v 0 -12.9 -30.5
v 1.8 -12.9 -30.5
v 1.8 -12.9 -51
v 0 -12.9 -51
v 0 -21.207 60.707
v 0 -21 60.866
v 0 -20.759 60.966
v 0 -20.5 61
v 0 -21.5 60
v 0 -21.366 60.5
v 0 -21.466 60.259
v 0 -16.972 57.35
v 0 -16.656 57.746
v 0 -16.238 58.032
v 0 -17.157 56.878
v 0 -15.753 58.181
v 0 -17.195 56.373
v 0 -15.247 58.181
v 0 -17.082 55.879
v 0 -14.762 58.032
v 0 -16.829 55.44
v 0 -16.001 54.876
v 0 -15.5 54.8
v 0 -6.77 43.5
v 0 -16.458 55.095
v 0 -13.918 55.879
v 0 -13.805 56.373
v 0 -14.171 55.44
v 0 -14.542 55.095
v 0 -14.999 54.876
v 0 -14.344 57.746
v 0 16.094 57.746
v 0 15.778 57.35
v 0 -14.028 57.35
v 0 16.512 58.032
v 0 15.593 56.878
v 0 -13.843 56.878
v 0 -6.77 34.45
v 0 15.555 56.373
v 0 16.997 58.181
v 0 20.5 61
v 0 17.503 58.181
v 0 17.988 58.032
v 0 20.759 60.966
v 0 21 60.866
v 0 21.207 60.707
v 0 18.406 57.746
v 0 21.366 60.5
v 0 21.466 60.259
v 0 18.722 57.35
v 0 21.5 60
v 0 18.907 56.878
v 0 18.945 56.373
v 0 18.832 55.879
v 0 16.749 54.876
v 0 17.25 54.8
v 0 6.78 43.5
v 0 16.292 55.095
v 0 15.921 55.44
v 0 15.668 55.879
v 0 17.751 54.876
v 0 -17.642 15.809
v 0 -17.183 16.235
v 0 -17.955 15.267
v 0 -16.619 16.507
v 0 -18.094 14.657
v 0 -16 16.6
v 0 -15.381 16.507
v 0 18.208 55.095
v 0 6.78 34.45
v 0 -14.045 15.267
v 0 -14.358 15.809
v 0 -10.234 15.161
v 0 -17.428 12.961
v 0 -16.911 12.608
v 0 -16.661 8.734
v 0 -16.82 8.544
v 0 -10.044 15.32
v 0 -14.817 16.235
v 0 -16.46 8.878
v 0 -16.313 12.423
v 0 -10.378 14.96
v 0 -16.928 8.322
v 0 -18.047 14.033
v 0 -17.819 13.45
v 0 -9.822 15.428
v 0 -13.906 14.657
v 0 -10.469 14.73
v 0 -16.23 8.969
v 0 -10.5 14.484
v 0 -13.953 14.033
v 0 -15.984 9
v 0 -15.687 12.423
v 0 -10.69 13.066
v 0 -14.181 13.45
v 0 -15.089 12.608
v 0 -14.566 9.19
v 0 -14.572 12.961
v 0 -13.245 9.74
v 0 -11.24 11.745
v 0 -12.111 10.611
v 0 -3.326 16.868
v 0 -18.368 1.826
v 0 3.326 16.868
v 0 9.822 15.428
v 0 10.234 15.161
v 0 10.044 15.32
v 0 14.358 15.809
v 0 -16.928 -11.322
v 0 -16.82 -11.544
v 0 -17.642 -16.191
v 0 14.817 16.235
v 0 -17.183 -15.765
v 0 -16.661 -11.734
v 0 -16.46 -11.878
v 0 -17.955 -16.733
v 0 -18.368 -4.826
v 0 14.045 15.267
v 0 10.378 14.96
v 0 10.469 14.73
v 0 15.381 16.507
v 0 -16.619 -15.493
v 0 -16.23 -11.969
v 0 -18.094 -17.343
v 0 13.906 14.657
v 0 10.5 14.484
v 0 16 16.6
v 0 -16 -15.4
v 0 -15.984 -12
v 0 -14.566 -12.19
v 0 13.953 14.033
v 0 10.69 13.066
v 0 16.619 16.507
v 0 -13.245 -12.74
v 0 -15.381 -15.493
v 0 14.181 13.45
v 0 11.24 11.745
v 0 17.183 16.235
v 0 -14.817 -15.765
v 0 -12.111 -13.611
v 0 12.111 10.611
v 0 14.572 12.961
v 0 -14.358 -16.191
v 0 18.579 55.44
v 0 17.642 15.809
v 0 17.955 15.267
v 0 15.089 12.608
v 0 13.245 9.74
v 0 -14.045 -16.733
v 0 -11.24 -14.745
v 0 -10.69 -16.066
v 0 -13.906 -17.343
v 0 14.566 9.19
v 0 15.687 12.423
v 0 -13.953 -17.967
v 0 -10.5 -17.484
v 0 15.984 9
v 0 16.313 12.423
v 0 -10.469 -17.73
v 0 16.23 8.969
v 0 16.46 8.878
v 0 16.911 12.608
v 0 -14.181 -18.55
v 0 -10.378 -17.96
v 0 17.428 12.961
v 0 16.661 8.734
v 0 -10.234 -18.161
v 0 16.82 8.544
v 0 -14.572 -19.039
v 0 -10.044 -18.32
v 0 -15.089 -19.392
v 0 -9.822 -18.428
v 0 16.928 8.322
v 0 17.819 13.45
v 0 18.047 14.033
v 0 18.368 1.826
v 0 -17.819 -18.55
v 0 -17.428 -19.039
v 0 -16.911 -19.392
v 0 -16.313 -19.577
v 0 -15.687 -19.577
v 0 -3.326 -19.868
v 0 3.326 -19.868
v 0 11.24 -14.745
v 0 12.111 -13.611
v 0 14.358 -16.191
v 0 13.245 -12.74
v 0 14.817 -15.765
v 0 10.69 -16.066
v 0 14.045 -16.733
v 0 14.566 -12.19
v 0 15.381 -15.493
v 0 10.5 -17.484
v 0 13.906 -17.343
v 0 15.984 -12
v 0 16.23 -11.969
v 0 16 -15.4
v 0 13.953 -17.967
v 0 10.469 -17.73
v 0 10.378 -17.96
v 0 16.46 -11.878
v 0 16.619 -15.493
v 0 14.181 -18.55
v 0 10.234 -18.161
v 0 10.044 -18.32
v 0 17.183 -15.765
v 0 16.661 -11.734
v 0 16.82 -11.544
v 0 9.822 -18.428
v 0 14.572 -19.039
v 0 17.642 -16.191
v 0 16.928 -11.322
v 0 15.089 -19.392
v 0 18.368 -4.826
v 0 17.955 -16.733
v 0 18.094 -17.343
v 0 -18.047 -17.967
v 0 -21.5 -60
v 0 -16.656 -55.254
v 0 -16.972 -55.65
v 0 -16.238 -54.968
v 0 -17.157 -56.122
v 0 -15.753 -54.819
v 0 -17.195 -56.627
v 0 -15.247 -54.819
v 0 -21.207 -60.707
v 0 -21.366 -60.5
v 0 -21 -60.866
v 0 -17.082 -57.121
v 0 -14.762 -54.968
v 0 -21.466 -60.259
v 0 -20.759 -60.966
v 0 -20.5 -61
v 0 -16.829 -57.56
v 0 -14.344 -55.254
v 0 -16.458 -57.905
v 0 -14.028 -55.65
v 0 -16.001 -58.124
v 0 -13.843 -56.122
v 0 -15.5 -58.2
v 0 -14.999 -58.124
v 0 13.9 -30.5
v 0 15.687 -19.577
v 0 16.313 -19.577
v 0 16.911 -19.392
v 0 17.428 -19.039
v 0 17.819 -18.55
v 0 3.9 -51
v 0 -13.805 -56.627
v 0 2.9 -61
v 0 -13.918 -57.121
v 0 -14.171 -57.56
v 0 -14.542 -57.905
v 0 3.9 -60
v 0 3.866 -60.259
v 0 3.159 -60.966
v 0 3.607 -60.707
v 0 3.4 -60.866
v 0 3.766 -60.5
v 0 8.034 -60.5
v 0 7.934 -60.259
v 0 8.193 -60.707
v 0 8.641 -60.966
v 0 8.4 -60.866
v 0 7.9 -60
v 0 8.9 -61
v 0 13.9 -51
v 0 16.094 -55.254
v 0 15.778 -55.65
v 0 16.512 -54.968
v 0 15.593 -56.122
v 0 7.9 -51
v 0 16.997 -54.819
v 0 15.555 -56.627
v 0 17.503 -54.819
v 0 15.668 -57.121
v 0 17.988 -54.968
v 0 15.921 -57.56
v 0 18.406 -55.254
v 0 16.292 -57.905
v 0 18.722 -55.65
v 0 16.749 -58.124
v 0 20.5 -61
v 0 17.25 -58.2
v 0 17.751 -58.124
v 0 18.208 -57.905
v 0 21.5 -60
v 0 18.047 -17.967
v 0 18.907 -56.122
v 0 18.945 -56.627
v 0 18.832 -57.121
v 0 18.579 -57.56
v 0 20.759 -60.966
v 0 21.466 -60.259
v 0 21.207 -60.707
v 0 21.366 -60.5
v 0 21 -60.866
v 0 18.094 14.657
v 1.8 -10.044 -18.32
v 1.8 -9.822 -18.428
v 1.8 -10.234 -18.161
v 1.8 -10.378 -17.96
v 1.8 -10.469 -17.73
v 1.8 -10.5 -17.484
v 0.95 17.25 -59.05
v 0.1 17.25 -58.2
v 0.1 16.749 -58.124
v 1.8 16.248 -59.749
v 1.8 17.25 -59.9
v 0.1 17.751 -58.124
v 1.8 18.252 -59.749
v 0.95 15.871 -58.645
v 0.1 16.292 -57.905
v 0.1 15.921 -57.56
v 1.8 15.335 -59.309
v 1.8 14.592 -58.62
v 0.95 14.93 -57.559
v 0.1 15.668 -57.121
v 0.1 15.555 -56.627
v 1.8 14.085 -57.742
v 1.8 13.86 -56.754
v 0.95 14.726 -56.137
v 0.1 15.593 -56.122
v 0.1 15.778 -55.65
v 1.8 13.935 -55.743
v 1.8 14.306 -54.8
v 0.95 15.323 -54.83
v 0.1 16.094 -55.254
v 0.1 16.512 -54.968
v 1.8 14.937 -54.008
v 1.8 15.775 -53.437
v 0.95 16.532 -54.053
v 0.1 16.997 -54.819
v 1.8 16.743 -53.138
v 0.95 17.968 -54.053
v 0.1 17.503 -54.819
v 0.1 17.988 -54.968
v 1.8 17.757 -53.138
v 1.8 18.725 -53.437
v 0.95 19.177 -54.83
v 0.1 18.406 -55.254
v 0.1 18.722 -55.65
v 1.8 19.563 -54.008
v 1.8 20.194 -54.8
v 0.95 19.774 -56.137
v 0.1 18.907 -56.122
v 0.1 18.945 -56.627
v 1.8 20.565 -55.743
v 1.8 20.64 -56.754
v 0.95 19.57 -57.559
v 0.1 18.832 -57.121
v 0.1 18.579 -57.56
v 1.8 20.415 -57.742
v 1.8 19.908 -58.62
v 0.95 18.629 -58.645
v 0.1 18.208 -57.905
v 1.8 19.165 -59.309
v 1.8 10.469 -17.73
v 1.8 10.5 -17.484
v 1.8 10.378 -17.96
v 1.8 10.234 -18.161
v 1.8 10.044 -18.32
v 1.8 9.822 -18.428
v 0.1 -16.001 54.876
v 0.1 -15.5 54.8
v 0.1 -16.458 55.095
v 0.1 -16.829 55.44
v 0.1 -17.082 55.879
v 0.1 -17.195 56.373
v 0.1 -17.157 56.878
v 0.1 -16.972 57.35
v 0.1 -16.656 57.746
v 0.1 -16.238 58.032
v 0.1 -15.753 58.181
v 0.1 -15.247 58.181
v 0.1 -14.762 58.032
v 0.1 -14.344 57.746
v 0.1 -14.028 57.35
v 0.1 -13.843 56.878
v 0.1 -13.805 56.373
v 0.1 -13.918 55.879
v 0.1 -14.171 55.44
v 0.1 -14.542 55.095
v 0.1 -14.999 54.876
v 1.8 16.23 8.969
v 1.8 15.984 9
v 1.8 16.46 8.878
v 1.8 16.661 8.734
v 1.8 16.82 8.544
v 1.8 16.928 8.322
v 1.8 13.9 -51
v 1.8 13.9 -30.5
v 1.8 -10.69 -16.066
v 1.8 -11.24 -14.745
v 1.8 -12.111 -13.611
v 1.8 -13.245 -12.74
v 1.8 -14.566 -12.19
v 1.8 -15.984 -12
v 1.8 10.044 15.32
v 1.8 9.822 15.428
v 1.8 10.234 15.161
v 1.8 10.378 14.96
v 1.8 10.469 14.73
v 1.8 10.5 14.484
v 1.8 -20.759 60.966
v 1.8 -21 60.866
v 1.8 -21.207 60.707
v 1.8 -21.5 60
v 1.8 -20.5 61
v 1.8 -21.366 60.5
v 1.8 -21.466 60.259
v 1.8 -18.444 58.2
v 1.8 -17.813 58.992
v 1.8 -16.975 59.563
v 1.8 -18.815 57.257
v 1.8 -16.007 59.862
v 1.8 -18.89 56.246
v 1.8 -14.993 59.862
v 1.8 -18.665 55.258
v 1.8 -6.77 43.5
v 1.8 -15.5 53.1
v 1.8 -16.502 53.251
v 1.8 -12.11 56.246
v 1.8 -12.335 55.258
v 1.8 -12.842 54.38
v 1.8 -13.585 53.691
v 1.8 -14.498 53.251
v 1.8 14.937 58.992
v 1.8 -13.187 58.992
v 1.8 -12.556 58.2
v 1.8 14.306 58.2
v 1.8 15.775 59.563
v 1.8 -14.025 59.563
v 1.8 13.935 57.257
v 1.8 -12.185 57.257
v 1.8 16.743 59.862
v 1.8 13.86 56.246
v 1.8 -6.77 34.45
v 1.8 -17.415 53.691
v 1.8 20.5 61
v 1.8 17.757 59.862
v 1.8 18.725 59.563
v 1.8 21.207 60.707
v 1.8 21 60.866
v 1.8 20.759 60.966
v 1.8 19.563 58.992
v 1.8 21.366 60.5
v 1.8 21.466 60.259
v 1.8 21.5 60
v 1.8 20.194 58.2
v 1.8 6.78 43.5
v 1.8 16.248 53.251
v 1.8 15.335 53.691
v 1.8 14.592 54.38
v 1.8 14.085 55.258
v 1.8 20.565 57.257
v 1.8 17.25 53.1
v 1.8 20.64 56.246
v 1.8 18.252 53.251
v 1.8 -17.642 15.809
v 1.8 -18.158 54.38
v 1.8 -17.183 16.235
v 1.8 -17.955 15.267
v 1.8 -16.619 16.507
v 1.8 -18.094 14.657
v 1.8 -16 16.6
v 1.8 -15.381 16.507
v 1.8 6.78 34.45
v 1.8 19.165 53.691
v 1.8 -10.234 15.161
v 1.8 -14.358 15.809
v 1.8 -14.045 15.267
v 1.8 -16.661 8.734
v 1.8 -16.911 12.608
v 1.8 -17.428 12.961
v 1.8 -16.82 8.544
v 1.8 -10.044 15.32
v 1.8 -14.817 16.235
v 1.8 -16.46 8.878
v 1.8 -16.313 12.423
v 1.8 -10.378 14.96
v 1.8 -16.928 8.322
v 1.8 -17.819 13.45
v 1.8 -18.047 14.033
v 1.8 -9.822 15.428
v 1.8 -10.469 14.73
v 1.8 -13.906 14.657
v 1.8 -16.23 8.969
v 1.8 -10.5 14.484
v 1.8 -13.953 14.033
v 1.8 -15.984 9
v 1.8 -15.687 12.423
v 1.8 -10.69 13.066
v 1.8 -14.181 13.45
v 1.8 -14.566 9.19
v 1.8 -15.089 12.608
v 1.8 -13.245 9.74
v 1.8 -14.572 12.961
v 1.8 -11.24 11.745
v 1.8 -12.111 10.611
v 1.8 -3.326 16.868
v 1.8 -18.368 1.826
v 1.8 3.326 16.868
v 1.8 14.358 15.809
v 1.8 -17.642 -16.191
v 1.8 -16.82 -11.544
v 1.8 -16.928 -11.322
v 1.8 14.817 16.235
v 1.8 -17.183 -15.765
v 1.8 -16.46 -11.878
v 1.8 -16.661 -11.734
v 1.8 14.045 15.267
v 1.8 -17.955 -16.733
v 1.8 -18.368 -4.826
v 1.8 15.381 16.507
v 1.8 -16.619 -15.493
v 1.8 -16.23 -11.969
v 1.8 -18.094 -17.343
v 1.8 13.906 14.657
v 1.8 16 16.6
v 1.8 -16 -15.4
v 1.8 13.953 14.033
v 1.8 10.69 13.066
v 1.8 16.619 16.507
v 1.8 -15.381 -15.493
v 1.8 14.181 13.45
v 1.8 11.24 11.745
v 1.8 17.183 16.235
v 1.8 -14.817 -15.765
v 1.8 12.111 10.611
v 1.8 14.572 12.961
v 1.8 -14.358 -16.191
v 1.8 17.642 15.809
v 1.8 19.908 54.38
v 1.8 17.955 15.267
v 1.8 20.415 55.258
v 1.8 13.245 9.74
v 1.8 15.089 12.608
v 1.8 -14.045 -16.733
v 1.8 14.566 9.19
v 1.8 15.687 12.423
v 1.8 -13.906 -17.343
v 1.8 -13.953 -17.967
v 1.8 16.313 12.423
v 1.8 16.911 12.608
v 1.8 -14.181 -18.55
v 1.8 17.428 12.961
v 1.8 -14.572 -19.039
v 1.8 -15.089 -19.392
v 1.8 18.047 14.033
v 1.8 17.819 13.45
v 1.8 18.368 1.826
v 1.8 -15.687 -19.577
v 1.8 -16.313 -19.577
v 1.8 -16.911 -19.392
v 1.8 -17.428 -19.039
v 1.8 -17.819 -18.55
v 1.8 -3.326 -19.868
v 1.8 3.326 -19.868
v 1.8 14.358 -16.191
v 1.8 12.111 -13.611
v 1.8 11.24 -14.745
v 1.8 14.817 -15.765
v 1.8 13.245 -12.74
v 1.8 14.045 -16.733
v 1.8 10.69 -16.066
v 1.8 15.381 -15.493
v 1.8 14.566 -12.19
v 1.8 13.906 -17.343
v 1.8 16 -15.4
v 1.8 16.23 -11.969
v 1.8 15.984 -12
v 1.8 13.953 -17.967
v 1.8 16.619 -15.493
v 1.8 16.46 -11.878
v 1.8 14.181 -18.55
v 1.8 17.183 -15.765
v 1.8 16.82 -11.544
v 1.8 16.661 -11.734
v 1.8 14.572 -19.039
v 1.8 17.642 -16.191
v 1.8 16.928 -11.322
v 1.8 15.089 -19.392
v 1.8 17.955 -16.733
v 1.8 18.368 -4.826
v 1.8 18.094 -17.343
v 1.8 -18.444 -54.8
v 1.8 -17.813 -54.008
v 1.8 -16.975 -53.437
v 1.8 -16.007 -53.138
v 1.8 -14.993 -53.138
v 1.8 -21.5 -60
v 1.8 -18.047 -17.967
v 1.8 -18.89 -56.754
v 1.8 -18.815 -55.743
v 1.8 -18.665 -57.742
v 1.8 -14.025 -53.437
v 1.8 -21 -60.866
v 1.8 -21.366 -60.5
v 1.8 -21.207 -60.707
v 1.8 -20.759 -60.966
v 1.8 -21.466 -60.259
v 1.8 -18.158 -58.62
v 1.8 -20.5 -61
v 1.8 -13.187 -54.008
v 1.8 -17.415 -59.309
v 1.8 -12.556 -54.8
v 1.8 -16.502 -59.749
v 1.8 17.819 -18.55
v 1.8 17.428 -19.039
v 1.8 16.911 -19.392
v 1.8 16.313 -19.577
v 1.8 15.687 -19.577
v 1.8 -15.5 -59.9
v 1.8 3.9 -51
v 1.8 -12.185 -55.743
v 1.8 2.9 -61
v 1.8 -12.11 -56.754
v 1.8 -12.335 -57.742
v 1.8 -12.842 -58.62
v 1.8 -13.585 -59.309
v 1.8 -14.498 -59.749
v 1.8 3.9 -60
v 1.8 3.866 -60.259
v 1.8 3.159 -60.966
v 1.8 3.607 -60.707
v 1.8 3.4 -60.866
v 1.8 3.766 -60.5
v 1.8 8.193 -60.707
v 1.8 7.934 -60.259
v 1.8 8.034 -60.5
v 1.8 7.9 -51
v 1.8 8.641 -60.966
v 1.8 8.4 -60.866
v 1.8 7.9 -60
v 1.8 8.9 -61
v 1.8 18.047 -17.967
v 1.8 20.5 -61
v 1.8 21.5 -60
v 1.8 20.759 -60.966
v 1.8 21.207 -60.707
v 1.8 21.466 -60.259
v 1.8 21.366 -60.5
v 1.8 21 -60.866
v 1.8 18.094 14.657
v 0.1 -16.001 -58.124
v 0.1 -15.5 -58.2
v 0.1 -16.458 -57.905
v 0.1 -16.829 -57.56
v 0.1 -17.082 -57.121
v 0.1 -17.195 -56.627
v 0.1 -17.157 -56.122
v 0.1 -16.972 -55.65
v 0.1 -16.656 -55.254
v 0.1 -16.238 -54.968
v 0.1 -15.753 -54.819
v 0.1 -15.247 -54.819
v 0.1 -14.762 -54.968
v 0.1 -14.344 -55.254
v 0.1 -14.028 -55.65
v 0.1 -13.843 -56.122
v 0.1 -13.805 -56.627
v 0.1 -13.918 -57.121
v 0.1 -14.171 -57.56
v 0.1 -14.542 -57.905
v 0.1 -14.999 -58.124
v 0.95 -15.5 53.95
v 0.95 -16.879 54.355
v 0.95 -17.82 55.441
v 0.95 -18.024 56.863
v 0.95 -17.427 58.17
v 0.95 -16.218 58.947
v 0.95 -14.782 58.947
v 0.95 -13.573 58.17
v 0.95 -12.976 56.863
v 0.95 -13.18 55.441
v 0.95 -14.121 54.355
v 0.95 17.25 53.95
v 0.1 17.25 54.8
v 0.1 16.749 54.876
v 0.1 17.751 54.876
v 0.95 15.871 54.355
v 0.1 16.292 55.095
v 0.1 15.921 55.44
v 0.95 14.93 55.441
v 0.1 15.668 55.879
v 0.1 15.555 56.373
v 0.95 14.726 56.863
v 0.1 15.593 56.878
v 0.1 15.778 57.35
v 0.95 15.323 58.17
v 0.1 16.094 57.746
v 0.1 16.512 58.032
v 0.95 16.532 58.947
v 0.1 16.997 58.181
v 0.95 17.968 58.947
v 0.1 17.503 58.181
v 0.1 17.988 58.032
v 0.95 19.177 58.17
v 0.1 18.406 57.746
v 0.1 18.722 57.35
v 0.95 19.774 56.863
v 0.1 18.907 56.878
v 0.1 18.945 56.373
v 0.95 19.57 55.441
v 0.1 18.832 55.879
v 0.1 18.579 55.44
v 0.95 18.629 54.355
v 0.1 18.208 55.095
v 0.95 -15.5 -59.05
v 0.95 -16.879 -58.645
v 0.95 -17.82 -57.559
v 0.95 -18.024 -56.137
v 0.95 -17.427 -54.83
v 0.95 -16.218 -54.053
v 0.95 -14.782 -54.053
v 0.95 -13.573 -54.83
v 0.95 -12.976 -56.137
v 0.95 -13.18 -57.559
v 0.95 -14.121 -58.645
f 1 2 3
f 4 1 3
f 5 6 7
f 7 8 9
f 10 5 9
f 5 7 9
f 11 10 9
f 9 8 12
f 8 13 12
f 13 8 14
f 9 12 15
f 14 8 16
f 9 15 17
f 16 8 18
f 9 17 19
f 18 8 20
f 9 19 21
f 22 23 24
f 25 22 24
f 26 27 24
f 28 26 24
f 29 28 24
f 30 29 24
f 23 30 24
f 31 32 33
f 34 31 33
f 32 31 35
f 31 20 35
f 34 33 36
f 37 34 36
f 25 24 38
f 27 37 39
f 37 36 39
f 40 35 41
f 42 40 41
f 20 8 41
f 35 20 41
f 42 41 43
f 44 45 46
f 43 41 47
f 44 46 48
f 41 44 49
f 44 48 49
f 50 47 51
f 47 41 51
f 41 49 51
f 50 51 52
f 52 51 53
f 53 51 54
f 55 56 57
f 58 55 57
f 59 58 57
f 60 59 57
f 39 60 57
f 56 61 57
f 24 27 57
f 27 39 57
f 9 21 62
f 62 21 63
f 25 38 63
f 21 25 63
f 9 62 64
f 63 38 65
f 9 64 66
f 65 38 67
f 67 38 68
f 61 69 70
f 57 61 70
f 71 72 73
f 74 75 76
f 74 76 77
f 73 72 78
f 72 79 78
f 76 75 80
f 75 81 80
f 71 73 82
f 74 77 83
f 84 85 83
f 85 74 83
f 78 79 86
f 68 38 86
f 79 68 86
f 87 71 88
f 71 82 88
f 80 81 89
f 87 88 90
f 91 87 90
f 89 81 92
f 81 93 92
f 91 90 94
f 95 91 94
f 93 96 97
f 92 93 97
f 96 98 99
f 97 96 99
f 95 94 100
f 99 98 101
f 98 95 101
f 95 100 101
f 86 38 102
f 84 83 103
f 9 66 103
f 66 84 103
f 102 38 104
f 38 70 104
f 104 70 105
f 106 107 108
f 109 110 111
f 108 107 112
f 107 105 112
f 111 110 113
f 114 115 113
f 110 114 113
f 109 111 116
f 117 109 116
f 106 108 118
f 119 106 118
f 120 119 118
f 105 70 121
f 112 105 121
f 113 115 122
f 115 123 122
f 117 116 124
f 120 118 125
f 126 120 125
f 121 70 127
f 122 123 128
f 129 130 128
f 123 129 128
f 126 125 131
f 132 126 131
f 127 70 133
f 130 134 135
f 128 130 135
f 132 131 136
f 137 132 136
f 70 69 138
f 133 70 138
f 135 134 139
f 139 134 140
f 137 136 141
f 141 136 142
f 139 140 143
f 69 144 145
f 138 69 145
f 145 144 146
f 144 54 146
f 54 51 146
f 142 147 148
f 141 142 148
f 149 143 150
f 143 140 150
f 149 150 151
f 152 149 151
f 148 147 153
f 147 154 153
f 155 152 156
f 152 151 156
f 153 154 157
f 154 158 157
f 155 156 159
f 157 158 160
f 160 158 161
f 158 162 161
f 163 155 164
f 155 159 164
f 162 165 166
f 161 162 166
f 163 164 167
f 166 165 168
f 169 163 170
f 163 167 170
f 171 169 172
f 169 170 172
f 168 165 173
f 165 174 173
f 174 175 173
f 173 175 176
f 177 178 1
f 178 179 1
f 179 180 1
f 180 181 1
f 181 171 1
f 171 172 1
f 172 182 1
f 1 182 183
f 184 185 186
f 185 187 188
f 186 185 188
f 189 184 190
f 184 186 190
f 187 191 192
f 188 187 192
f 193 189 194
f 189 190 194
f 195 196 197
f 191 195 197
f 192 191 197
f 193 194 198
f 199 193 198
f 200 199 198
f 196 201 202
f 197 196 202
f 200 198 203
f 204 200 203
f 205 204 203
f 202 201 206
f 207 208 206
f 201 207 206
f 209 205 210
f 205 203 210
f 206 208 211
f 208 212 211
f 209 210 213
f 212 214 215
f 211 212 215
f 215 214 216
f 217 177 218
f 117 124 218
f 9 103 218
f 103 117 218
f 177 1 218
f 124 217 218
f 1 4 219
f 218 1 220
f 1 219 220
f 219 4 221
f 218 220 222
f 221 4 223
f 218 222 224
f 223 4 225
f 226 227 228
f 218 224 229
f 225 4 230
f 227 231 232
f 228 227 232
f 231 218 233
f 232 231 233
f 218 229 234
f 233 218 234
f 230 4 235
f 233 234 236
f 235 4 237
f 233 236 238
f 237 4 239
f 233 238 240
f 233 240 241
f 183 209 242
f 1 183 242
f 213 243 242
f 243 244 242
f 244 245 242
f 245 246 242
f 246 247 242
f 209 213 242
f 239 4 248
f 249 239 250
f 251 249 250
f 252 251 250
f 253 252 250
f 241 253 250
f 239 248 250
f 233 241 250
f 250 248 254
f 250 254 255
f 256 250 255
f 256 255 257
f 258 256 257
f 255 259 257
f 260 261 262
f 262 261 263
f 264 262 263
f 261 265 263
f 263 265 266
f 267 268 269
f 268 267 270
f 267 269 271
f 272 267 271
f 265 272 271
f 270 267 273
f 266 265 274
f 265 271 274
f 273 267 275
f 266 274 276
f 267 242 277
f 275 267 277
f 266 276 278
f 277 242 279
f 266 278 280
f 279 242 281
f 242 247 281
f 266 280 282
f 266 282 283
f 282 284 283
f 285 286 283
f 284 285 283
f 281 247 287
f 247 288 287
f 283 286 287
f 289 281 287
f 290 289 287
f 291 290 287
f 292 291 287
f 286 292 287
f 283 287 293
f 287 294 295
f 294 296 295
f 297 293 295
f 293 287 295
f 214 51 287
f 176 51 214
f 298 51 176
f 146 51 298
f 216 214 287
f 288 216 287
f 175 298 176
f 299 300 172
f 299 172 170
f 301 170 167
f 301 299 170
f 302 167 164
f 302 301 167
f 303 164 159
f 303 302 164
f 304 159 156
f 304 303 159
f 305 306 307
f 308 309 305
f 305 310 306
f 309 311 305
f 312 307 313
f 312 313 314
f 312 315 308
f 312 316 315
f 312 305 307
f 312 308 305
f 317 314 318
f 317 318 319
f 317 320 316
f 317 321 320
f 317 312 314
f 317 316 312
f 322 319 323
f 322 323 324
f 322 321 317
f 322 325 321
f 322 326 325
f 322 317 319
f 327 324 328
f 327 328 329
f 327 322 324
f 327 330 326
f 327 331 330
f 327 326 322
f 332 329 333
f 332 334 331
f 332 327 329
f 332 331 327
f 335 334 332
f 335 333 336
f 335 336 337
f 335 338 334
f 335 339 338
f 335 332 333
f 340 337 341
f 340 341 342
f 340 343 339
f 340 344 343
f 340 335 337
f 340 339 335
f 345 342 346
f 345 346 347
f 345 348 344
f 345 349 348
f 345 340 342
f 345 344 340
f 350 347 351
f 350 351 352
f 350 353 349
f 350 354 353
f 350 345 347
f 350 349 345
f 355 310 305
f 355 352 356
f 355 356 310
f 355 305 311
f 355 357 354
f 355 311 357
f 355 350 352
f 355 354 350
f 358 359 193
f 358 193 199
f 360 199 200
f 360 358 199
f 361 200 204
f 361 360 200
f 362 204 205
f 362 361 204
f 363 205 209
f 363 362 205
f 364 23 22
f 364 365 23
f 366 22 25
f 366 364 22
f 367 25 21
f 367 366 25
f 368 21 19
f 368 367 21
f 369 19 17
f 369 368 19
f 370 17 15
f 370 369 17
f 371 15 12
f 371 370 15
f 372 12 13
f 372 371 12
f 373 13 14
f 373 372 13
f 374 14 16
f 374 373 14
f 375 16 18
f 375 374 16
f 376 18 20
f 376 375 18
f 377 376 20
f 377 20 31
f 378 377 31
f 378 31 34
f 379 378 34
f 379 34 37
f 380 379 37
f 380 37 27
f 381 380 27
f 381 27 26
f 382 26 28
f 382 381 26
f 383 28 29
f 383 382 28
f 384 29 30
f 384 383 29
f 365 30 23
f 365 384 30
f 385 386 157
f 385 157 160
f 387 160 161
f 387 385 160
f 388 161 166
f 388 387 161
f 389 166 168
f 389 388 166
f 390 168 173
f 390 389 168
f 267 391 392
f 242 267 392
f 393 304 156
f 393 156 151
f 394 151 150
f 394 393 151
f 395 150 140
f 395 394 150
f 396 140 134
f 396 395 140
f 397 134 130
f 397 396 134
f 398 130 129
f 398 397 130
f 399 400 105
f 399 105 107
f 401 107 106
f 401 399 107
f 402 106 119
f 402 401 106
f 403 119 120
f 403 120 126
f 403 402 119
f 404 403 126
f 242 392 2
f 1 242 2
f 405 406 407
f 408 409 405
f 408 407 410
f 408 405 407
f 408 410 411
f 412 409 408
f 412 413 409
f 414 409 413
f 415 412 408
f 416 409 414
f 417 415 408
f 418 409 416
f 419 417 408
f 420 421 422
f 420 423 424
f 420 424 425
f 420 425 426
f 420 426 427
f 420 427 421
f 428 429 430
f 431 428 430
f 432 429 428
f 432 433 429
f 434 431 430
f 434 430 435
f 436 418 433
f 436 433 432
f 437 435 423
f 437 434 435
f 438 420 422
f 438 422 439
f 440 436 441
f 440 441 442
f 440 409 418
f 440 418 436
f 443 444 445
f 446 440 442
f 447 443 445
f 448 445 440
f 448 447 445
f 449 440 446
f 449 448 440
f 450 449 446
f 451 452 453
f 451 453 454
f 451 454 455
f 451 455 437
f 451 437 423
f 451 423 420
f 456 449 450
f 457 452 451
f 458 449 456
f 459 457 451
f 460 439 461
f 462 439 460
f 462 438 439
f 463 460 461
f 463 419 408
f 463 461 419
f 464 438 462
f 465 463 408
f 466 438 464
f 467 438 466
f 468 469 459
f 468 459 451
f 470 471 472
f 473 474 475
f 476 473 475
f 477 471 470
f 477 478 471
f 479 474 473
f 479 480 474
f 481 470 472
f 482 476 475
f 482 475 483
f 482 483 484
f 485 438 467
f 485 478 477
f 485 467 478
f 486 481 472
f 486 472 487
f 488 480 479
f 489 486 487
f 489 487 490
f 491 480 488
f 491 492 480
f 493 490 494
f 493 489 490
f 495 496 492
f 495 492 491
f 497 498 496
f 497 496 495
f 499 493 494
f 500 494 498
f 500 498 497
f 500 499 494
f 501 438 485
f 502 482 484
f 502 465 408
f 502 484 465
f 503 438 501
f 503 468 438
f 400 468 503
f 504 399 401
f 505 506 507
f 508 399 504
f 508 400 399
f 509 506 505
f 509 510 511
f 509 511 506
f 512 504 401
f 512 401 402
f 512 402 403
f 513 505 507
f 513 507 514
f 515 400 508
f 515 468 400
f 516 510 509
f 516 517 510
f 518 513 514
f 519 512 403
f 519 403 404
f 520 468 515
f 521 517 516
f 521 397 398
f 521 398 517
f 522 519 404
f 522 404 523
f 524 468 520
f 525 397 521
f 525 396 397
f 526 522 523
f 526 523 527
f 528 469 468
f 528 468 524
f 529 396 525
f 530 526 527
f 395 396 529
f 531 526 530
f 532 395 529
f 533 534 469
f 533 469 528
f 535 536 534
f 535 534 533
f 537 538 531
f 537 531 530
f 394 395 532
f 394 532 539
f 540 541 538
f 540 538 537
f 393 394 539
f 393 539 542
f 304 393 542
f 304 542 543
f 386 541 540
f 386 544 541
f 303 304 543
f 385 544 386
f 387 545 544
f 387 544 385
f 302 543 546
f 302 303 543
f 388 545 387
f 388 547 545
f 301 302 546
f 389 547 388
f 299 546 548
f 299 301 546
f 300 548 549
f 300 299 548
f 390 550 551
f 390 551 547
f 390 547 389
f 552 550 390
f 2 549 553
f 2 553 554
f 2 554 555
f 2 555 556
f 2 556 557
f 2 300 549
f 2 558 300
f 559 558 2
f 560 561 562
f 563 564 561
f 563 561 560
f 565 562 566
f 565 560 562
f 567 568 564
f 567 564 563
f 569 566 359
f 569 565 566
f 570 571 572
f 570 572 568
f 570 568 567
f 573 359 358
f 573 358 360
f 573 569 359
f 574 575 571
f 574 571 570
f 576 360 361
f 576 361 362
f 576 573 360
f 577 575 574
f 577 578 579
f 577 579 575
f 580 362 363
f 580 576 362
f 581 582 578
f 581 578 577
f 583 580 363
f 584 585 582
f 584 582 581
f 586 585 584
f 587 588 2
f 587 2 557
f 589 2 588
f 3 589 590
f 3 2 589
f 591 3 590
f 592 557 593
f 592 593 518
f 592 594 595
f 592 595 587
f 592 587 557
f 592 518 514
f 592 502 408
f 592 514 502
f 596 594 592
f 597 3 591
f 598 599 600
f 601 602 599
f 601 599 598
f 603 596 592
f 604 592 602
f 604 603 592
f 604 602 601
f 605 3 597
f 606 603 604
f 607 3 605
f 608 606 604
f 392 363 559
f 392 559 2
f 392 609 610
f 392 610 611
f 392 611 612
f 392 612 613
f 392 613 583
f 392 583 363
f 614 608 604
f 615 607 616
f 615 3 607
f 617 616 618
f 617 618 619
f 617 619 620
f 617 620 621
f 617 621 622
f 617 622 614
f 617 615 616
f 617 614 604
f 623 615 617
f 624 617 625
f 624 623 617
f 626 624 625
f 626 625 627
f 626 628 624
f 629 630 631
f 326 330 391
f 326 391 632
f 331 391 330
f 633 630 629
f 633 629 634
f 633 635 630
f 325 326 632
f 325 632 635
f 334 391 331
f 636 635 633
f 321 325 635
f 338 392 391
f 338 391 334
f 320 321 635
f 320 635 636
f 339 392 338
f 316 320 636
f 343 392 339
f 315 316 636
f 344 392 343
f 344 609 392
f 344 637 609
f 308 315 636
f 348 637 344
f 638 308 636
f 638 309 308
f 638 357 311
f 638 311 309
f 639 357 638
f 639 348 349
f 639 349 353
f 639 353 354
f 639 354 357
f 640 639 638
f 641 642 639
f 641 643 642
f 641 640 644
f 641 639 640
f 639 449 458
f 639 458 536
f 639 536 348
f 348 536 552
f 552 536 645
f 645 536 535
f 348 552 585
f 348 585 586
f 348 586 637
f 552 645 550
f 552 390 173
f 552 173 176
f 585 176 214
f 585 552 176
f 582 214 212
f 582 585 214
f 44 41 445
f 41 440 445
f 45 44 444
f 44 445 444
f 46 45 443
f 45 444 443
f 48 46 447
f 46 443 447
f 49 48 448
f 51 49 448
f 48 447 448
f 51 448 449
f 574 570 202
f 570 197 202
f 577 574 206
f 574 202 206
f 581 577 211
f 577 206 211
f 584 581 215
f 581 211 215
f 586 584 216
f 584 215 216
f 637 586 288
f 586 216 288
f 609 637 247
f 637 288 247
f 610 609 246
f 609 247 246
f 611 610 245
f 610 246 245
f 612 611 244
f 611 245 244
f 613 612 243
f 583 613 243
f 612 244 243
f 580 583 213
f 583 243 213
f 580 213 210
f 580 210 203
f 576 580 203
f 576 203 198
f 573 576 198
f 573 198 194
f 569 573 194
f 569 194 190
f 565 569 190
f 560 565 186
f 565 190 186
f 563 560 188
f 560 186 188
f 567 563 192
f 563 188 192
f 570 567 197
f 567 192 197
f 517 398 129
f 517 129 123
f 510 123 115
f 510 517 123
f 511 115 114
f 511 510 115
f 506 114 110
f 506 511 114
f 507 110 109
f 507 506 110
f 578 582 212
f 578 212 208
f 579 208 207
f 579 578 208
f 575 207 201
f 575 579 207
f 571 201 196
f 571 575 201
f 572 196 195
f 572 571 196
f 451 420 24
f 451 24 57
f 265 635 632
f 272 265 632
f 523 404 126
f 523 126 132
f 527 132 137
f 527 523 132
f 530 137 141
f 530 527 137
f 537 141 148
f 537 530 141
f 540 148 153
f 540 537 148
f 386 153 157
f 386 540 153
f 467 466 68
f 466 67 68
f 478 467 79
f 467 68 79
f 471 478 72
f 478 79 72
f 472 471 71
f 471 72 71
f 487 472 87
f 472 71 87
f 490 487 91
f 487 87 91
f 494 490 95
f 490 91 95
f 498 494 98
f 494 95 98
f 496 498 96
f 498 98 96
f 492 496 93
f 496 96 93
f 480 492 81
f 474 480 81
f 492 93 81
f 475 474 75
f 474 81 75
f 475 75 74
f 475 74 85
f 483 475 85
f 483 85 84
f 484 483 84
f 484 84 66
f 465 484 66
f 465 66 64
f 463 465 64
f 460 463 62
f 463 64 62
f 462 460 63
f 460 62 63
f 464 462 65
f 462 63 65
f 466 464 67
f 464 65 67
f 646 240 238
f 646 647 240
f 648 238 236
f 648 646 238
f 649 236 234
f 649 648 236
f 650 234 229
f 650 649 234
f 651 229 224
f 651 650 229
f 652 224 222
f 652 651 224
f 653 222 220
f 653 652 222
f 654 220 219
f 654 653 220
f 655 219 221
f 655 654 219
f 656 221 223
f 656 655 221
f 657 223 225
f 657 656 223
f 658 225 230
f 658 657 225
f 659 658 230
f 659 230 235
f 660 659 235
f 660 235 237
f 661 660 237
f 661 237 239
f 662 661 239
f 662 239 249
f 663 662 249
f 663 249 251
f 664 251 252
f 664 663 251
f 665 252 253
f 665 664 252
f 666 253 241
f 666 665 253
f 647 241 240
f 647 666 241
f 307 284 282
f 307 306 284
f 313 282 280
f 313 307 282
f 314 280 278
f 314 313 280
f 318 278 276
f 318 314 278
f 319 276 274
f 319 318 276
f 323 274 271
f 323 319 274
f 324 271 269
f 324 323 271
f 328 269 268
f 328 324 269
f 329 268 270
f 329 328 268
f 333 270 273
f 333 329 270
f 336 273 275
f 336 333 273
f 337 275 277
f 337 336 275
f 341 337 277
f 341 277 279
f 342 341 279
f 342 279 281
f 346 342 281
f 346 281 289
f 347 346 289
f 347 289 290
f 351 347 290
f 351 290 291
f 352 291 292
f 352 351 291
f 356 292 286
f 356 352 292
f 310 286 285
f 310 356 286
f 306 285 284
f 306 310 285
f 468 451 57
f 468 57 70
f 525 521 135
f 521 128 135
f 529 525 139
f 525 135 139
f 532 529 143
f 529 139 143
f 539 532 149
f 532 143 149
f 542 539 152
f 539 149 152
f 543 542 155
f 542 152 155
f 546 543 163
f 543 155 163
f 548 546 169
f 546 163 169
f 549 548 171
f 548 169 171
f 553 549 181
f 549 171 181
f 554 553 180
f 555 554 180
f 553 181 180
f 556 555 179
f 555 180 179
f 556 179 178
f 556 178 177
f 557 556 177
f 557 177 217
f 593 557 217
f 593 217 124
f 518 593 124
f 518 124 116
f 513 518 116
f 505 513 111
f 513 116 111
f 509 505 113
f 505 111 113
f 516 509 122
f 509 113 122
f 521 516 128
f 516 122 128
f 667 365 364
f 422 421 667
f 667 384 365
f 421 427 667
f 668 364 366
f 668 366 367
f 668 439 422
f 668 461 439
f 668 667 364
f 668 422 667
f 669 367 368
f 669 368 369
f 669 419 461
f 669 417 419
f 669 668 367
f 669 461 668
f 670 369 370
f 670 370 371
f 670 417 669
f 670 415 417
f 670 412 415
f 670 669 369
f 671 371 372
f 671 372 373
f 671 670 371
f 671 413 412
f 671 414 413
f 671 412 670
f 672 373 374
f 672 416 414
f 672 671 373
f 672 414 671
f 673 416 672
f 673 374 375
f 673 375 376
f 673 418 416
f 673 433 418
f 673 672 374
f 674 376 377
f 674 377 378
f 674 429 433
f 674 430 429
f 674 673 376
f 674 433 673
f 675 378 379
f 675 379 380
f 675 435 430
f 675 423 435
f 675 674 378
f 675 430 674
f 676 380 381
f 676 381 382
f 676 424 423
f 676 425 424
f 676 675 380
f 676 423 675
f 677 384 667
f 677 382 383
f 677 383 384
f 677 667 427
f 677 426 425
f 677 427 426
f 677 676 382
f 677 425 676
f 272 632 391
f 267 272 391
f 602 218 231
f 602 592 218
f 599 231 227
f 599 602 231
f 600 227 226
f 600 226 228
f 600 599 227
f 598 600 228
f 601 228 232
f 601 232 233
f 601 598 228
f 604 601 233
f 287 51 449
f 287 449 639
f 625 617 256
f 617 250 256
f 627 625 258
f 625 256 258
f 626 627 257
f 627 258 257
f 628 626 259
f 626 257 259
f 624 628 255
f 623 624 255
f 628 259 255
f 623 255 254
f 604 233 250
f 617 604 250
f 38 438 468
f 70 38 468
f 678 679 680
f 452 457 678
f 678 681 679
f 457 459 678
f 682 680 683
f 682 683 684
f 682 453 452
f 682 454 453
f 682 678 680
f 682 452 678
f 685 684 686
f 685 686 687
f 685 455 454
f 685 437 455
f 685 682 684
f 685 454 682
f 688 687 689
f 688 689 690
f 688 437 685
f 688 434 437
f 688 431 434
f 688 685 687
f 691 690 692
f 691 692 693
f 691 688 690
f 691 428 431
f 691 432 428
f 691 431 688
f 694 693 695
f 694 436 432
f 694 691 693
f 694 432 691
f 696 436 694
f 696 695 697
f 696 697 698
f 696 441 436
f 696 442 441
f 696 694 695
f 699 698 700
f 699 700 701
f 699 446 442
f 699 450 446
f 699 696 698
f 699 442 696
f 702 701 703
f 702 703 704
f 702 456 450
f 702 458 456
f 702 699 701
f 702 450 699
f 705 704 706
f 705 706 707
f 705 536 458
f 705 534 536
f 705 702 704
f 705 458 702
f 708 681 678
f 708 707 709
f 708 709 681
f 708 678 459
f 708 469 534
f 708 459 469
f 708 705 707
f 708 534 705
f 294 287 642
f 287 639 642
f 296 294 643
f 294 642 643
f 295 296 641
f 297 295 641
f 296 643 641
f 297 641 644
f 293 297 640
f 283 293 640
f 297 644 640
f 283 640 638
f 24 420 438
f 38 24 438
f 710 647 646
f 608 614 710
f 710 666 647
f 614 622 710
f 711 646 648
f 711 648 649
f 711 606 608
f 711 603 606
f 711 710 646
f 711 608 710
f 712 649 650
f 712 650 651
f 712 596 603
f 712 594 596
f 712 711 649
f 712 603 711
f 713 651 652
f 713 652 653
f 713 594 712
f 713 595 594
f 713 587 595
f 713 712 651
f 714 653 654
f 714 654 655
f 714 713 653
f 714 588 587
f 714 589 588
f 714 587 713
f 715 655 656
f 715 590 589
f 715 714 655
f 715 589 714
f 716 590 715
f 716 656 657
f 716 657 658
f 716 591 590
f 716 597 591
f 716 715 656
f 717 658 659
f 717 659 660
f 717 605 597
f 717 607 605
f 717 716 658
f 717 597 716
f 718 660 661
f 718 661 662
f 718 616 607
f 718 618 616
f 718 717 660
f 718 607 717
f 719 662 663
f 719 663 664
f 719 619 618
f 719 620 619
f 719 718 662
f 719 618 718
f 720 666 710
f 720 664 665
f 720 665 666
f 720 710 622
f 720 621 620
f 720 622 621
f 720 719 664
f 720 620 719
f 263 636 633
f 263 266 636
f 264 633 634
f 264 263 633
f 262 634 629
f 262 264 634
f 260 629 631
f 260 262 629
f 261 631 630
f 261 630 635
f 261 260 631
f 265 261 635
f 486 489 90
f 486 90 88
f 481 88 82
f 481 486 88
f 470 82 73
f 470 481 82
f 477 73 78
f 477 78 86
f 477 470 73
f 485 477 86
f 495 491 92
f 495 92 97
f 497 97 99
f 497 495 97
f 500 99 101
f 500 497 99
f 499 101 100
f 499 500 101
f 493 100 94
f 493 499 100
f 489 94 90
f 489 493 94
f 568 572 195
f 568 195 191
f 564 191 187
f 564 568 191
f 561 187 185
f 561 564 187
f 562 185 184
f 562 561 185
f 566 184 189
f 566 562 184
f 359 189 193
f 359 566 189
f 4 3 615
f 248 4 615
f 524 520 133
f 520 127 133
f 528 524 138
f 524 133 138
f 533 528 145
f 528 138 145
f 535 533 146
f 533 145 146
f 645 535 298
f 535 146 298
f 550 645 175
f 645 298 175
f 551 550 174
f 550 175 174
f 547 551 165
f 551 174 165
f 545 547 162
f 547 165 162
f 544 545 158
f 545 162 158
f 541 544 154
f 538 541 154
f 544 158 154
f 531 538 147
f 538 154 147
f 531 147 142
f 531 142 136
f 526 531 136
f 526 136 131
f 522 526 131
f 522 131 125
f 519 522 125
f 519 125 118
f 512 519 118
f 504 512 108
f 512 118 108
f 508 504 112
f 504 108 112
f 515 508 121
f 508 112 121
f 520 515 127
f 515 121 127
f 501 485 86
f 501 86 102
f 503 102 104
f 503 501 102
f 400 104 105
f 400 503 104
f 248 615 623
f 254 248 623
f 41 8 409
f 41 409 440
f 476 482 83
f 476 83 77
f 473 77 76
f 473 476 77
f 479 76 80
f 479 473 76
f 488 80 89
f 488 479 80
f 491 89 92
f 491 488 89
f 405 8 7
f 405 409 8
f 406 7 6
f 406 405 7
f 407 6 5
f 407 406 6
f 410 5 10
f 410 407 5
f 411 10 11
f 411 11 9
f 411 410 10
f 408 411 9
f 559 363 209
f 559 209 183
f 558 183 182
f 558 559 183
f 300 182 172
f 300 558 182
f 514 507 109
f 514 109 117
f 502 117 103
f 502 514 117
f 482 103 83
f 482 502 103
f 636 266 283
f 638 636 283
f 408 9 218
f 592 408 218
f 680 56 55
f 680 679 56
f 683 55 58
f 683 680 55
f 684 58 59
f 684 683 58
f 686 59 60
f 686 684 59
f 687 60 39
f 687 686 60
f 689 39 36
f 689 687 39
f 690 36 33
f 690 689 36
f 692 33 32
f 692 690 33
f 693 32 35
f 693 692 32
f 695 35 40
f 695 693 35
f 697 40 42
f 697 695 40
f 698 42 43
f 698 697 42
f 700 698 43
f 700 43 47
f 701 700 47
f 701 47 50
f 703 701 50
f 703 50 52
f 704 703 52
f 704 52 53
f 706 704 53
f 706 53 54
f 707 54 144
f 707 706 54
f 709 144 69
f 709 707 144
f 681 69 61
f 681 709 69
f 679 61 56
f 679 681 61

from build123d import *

# Parameters (mm, degrees)
SKETCH1_W                                    = 122
SKETCH1_H                                    = 43
BOSS_EXTRUDE1_DEPTH                          = 1.8
SKETCH2_W                                    = 9.05
SKETCH2_H                                    = 13.55
CUT_EXTRUDE1_DEPTH                           = 1.8
CSK_FOR_M3_COUNTERSUNK_FLAT_HEAD_SCR_2_COUNT = 2
CSK_FOR_M3_COUNTERSUNK_FLAT_HEAD_SCR_2_PITCH = 32.75
CSK_FOR_M3_COUNTERSUNK_FLAT_HEAD_SCR_3_COUNT = 2
CSK_FOR_M3_COUNTERSUNK_FLAT_HEAD_SCR_3_PITCH = 117.650169996
CSK_FOR_M3_COUNTERSUNK_FLAT_HEAD_SCR_4_COUNT = 2
CSK_FOR_M3_COUNTERSUNK_FLAT_HEAD_SCR_4_PITCH = 113
CUT_EXTRUDE2_DEPTH                           = 1.8
FILLET1_R                                    = 1
F_4_2_4_2_DIAMETER_HOLE1_D                   = 4.2
F_4_2_4_2_DIAMETER_HOLE1_DEPTH               = 1.8
F_4_2_4_2_DIAMETER_HOLE1_TIP                 = 1.2618073
CUT_EXTRUDE3_DEPTH                           = 1.8


with BuildPart() as part:
    # Sketch1 → Boss-Extrude1 (new body)
    with BuildSketch(Plane(origin=(0, 0, 0), x_dir=(0, 0, -1), z_dir=(1, 0, 0))):
        Rectangle(SKETCH1_W, SKETCH1_H)
    extrude(amount=BOSS_EXTRUDE1_DEPTH)

    # Sketch2 → Cut-Extrude1 (cut)
    with BuildSketch(Plane(origin=(1.8, 0, 0), x_dir=(0, 0, -1), z_dir=(1, 0, 0))):
        with Locations((-38.975, 0.005)):
            Rectangle(SKETCH2_W, SKETCH2_H)
    extrude(amount=-CUT_EXTRUDE1_DEPTH, mode=Mode.SUBTRACT)

    # Sketch3 → CSK for M3 Countersunk Flat Head Screw1 (revolve, cut)
    with BuildSketch(Plane(origin=(1.8, -15.5, 56.5), x_dir=(0, 0, -1), z_dir=(0, 1, 0))):
        Polygon((0, 0), (0, 1.8), (1.7, 1.8), (1.7, 1.7), (3.4, 0), align=None)
    csk_for_m3_countersunk_flat_head_screw1 = revolve(axis=Axis((8.15, -15.5, 56.5), (-1, 0, 0)), mode=Mode.SUBTRACT)

    # CSK for M3 Countersunk Flat Head Scr 2: CSK for M3 Countersunk Flat Head Screw1 ×2
    with Locations(*[(0, i * CSK_FOR_M3_COUNTERSUNK_FLAT_HEAD_SCR_2_PITCH, 0) for i in range(1, CSK_FOR_M3_COUNTERSUNK_FLAT_HEAD_SCR_2_COUNT)]):
        add(csk_for_m3_countersunk_flat_head_screw1, mode=Mode.SUBTRACT)

    # CSK for M3 Countersunk Flat Head Scr 3: CSK for M3 Countersunk Flat Head Screw1 ×2
    with Locations(*[Vector(0, 0.278367639, -0.9604746) * (i * CSK_FOR_M3_COUNTERSUNK_FLAT_HEAD_SCR_3_PITCH) for i in range(1, CSK_FOR_M3_COUNTERSUNK_FLAT_HEAD_SCR_3_COUNT)]):
        add(csk_for_m3_countersunk_flat_head_screw1, mode=Mode.SUBTRACT)

    # CSK for M3 Countersunk Flat Head Scr 4: CSK for M3 Countersunk Flat Head Screw1 ×2
    with Locations(*[(0, 0, -i * CSK_FOR_M3_COUNTERSUNK_FLAT_HEAD_SCR_4_PITCH) for i in range(1, CSK_FOR_M3_COUNTERSUNK_FLAT_HEAD_SCR_4_COUNT)]):
        add(csk_for_m3_countersunk_flat_head_screw1, mode=Mode.SUBTRACT)

    # Sketch5 → Cut-Extrude2 (cut)
    with BuildSketch(Plane(origin=(1.8, 0, 0), x_dir=(0, 0, -1), z_dir=(1, 0, 0))):
        Polygon((30.5, -12.9), (51, -12.9), (51, 3.9), (61, 3.9), (61, 7.9), (51, 7.9), (51, 13.9), (30.5, 13.9), align=None)
    extrude(amount=-CUT_EXTRUDE2_DEPTH, mode=Mode.SUBTRACT)

    # Fillet1
    fillet1_edges = [part.edges().sort_by_distance(p)[0] for p in [
        (0.9, 7.9, -61),
        (0.9, 3.9, -61),
        (0.9, 21.5, 61),
        (0.9, 21.5, -61),
        (0.9, -21.5, -61),
        (0.9, -21.5, 61),
    ]]
    fillet(fillet1_edges, radius=FILLET1_R)

    # Ø4.2 (4.2) Diameter Hole1
    with Locations(Plane(origin=(1.8, 0, 0), x_dir=(0, 0, -1), z_dir=(1, 0, 0))):
        with Locations((-14.5, 16), (17.5, 16), (17.5, -16), (-14.5, -16)):
            Hole(F_4_2_4_2_DIAMETER_HOLE1_D / 2, depth=F_4_2_4_2_DIAMETER_HOLE1_DEPTH)
            with Locations((0, 0, -(F_4_2_4_2_DIAMETER_HOLE1_DEPTH + F_4_2_4_2_DIAMETER_HOLE1_TIP / 2))):  # 118° drill point
                Cone(0, F_4_2_4_2_DIAMETER_HOLE1_D / 2, F_4_2_4_2_DIAMETER_HOLE1_TIP, mode=Mode.SUBTRACT)

    # Sketch8 → Cut-Extrude3 (cut)
    with BuildSketch(Plane(origin=(1.8, 0, 0), x_dir=(0, 0, -1), z_dir=(1, 0, 0))):
        with BuildLine():
            ThreePointArc((12.000022812, 15.984159355), (13.610912703, 12.110912703), (17.484159355, 10.500022812))
            ThreePointArc((17.484159355, 10.500022812), (18.064905248, 10.312049545), (18.428192241, 9.821516873))
            ThreePointArc((18.428192241, 9.821516873), (20.05, 0), (18.428192241, -9.821516873))
            ThreePointArc((18.428192241, -9.821516873), (18.064905248, -10.312049545), (17.484159355, -10.500022812))
            ThreePointArc((17.484159355, -10.500022812), (13.610912703, -12.110912703), (12.000022812, -15.984159355))
            ThreePointArc((12.000022812, -15.984159355), (11.812049545, -16.564905248), (11.321516873, -16.928192241))
            ThreePointArc((11.321516873, -16.928192241), (1.5, -18.55), (-8.321516873, -16.928192241))
            ThreePointArc((-8.321516873, -16.928192241), (-8.812049545, -16.564905248), (-9.000022812, -15.984159355))
            ThreePointArc((-9.000022812, -15.984159355), (-10.610912703, -12.110912703), (-14.484159355, -10.500022812))
            ThreePointArc((-14.484159355, -10.500022812), (-15.064905248, -10.312049545), (-15.428192241, -9.821516873))
            ThreePointArc((-15.428192241, -9.821516873), (-17.05, 0), (-15.428192241, 9.821516873))
            ThreePointArc((-15.428192241, 9.821516873), (-15.064905248, 10.312049545), (-14.484159355, 10.500022812))
            ThreePointArc((-14.484159355, 10.500022812), (-10.610912703, 12.110912703), (-9.000022812, 15.984159355))
            ThreePointArc((-9.000022812, 15.984159355), (-8.812049545, 16.564905248), (-8.321516873, 16.928192241))
            ThreePointArc((-8.321516873, 16.928192241), (1.5, 18.55), (11.321516873, 16.928192241))
            ThreePointArc((11.321516873, 16.928192241), (11.812049545, 16.564905248), (12.000022812, 15.984159355))
        make_face()
    extrude(amount=-CUT_EXTRUDE3_DEPTH, mode=Mode.SUBTRACT)


solid = part.part
